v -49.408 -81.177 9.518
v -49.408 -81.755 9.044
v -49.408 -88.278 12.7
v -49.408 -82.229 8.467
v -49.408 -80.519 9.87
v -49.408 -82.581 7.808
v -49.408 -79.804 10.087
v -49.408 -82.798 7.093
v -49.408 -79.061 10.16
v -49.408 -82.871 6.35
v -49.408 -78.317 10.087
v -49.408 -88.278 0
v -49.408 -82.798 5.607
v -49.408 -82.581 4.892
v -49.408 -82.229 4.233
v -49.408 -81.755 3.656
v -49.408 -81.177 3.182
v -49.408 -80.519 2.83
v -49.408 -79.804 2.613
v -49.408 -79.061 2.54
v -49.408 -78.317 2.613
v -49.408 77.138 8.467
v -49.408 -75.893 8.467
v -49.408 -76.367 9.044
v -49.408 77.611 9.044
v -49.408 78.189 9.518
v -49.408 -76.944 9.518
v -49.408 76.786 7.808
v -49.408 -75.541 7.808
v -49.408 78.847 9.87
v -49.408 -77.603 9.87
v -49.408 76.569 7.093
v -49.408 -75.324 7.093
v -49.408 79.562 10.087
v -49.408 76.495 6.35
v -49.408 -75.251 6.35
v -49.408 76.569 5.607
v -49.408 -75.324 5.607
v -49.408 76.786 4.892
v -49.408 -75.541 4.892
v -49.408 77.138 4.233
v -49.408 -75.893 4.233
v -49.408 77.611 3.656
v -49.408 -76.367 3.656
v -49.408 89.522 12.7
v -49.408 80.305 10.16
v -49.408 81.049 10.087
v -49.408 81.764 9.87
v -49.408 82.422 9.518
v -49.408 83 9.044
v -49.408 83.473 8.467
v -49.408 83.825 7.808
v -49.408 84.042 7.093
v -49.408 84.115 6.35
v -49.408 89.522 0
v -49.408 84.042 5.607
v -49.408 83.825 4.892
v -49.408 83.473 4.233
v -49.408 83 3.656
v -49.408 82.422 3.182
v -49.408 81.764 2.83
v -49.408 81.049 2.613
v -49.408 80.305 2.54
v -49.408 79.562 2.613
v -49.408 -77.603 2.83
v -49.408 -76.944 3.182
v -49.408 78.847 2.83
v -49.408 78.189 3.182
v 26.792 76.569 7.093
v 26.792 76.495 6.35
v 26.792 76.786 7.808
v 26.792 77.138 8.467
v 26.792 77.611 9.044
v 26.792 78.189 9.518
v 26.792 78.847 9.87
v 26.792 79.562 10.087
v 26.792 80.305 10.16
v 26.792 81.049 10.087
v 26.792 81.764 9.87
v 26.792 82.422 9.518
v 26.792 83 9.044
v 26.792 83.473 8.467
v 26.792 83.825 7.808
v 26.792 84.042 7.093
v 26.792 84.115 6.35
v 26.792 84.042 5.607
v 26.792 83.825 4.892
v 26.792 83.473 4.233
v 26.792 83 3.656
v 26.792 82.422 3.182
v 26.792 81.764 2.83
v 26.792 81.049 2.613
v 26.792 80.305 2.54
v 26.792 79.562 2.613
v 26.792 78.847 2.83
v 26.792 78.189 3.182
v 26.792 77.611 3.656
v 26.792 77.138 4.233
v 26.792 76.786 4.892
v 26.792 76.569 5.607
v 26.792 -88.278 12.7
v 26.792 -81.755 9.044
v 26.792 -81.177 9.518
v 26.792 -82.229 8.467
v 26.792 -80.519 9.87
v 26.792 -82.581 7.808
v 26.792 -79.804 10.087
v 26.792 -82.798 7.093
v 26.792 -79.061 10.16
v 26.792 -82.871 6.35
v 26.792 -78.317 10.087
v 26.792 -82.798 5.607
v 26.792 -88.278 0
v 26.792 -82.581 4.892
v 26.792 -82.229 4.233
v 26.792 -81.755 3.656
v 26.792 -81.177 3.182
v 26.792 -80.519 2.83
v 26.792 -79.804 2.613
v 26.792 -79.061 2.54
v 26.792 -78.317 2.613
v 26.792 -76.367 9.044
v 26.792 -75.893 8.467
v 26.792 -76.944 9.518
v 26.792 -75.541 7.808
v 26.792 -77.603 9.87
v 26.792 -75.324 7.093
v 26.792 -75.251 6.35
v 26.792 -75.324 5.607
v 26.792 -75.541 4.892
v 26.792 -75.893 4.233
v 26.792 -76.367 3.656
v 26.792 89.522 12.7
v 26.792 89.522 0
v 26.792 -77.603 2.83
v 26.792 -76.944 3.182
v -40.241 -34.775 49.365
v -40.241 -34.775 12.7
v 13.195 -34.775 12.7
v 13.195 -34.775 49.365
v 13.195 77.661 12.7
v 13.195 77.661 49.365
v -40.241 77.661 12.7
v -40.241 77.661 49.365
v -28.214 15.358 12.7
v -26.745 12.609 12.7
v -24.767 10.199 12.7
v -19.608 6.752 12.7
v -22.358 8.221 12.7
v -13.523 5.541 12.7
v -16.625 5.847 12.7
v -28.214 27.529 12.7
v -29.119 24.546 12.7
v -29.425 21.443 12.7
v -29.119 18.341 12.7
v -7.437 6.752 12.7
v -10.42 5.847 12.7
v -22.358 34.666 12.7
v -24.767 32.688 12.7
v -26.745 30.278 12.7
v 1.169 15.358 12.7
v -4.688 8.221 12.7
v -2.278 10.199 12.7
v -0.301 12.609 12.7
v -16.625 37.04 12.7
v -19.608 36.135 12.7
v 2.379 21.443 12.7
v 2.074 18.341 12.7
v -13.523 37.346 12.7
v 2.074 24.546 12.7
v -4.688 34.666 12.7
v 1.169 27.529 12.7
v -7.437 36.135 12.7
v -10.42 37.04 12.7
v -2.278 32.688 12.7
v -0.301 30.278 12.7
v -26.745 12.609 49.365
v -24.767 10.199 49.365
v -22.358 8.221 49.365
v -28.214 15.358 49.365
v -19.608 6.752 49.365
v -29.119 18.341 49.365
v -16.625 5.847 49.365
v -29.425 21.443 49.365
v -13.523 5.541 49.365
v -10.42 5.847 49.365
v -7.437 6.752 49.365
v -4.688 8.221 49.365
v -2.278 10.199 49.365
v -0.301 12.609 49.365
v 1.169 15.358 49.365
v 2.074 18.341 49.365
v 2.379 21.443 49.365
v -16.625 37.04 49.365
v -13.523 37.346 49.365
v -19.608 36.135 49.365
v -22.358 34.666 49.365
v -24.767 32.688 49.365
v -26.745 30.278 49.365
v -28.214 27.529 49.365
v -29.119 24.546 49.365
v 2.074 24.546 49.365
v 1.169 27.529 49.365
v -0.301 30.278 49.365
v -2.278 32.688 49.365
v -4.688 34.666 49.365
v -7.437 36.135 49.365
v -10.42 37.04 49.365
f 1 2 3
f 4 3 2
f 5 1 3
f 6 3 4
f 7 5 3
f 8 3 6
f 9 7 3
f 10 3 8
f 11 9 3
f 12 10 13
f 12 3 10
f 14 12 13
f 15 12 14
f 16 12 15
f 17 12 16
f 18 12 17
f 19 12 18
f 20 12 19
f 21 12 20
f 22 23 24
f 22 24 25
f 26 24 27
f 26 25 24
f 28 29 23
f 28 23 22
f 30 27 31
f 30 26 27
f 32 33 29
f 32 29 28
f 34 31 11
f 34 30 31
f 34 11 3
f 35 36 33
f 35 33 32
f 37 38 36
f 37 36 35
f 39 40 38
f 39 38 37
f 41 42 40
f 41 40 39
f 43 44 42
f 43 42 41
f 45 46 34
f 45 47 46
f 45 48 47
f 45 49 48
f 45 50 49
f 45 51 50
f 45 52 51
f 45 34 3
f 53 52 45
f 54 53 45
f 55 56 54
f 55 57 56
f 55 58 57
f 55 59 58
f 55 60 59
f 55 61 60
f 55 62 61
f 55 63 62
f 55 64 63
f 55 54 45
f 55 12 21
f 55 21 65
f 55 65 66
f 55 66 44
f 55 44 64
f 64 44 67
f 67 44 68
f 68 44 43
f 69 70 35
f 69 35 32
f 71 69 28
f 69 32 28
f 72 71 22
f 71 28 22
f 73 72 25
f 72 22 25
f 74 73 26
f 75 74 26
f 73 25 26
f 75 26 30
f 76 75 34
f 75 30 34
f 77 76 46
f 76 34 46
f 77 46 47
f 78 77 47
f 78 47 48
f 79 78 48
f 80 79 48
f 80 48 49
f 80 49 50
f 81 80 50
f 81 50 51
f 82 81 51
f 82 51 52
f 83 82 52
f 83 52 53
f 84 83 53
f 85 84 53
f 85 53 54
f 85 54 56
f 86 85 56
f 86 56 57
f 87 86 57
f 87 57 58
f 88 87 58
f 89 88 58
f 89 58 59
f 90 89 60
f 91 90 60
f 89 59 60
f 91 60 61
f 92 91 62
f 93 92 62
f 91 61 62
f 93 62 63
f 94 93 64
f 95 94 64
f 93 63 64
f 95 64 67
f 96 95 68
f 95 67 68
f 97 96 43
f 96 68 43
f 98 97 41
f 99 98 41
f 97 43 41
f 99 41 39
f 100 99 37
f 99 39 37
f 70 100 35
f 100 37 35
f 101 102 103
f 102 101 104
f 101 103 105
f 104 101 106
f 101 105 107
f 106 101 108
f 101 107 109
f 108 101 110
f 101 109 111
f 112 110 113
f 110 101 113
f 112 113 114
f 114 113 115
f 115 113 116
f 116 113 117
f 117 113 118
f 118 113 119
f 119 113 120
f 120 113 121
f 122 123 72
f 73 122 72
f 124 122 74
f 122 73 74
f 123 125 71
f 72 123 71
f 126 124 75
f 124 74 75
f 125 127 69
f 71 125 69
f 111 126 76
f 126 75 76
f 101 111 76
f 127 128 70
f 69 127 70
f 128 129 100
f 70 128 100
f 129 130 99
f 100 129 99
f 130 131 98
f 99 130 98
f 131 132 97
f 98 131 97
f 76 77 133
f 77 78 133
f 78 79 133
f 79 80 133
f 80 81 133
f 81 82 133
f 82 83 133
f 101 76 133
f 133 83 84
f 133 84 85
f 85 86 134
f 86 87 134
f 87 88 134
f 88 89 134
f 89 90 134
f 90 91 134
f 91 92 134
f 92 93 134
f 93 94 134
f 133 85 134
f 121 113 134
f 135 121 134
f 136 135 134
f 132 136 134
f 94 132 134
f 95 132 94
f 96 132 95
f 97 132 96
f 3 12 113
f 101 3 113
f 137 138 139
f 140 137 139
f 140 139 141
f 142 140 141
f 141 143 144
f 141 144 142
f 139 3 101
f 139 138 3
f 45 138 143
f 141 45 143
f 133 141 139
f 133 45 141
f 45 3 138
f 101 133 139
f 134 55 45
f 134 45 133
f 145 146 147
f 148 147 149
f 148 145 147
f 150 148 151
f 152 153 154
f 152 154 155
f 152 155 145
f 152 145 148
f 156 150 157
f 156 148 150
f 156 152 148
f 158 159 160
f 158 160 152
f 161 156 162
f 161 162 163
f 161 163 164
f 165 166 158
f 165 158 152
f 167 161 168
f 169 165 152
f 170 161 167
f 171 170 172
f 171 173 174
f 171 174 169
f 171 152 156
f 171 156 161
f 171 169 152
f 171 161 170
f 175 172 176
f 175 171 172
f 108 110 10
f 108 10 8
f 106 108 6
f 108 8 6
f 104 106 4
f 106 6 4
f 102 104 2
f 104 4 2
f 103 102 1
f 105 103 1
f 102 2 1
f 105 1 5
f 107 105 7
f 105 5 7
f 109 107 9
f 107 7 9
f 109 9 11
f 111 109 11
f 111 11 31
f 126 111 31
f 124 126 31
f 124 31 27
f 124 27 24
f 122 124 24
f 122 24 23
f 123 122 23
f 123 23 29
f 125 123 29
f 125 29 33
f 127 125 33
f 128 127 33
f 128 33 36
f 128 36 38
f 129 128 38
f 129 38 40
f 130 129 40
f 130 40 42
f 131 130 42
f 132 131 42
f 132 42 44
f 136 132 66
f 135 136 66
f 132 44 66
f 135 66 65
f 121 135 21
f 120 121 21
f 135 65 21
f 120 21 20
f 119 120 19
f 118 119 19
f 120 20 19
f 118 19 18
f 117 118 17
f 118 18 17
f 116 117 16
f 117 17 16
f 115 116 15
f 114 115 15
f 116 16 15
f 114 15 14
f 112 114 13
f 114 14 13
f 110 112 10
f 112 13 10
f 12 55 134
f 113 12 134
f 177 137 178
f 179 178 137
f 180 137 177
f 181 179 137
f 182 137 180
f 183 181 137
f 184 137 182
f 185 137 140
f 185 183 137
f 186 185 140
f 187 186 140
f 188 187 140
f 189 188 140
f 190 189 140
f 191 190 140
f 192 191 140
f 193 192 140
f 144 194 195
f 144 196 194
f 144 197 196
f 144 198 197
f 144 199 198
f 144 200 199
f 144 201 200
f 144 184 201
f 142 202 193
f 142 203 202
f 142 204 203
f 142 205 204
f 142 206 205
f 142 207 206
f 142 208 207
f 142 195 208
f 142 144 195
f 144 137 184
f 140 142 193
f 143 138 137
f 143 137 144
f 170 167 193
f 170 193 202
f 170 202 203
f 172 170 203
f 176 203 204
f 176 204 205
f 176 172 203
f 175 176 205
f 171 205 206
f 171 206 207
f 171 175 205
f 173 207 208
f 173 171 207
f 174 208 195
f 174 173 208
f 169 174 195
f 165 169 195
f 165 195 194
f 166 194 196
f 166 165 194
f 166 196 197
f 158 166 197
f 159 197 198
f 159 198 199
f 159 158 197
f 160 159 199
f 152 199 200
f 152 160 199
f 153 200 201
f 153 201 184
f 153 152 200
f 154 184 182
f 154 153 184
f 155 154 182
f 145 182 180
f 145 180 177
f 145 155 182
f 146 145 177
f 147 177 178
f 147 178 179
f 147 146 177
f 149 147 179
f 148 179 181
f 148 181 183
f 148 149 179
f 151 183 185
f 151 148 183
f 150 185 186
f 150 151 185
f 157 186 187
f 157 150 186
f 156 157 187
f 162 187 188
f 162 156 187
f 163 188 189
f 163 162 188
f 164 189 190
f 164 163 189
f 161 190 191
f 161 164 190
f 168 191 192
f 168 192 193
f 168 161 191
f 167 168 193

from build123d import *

# Parameters (mm, degrees)
F0_W     = 76.2
F0_H     = 177.8
F1_DEPTH = 12.7
F3_D     = 7.62
F4_D     = 7.62
F6_W     = 53.435474
F6_H     = 112.436191
F6_R     = 15.902152
F7_DEPTH = 36.66461


with BuildPart() as f1:
    # F0 (on Top) → F1 (new body)
    with BuildSketch(Plane.XY):
        with Locations((-11.308188, 0.622381)):
            Rectangle(F0_W, F0_H)
    extrude(amount=F1_DEPTH)

    # F3 (through all)
    with Locations(Plane.YZ.offset(26.791812)):
        with Locations((-79.060733, 6.35)):
            Hole(F3_D / 2)

    # F4 (through all)
    with Locations(Plane.YZ.offset(26.791812)):
        with Locations((80.305494, 6.35)):
            Hole(F4_D / 2)

    # F6 (on face) → F7 (join)
    with BuildSketch(Plane.XY.offset(12.7)):
        with Locations((-13.522789, 21.443374)):
            Rectangle(F6_W, F6_H)
        with Locations((-13.522789, 21.443374)):
            Circle(F6_R, mode=Mode.SUBTRACT)
    extrude(amount=F7_DEPTH)


solid = f1.part
